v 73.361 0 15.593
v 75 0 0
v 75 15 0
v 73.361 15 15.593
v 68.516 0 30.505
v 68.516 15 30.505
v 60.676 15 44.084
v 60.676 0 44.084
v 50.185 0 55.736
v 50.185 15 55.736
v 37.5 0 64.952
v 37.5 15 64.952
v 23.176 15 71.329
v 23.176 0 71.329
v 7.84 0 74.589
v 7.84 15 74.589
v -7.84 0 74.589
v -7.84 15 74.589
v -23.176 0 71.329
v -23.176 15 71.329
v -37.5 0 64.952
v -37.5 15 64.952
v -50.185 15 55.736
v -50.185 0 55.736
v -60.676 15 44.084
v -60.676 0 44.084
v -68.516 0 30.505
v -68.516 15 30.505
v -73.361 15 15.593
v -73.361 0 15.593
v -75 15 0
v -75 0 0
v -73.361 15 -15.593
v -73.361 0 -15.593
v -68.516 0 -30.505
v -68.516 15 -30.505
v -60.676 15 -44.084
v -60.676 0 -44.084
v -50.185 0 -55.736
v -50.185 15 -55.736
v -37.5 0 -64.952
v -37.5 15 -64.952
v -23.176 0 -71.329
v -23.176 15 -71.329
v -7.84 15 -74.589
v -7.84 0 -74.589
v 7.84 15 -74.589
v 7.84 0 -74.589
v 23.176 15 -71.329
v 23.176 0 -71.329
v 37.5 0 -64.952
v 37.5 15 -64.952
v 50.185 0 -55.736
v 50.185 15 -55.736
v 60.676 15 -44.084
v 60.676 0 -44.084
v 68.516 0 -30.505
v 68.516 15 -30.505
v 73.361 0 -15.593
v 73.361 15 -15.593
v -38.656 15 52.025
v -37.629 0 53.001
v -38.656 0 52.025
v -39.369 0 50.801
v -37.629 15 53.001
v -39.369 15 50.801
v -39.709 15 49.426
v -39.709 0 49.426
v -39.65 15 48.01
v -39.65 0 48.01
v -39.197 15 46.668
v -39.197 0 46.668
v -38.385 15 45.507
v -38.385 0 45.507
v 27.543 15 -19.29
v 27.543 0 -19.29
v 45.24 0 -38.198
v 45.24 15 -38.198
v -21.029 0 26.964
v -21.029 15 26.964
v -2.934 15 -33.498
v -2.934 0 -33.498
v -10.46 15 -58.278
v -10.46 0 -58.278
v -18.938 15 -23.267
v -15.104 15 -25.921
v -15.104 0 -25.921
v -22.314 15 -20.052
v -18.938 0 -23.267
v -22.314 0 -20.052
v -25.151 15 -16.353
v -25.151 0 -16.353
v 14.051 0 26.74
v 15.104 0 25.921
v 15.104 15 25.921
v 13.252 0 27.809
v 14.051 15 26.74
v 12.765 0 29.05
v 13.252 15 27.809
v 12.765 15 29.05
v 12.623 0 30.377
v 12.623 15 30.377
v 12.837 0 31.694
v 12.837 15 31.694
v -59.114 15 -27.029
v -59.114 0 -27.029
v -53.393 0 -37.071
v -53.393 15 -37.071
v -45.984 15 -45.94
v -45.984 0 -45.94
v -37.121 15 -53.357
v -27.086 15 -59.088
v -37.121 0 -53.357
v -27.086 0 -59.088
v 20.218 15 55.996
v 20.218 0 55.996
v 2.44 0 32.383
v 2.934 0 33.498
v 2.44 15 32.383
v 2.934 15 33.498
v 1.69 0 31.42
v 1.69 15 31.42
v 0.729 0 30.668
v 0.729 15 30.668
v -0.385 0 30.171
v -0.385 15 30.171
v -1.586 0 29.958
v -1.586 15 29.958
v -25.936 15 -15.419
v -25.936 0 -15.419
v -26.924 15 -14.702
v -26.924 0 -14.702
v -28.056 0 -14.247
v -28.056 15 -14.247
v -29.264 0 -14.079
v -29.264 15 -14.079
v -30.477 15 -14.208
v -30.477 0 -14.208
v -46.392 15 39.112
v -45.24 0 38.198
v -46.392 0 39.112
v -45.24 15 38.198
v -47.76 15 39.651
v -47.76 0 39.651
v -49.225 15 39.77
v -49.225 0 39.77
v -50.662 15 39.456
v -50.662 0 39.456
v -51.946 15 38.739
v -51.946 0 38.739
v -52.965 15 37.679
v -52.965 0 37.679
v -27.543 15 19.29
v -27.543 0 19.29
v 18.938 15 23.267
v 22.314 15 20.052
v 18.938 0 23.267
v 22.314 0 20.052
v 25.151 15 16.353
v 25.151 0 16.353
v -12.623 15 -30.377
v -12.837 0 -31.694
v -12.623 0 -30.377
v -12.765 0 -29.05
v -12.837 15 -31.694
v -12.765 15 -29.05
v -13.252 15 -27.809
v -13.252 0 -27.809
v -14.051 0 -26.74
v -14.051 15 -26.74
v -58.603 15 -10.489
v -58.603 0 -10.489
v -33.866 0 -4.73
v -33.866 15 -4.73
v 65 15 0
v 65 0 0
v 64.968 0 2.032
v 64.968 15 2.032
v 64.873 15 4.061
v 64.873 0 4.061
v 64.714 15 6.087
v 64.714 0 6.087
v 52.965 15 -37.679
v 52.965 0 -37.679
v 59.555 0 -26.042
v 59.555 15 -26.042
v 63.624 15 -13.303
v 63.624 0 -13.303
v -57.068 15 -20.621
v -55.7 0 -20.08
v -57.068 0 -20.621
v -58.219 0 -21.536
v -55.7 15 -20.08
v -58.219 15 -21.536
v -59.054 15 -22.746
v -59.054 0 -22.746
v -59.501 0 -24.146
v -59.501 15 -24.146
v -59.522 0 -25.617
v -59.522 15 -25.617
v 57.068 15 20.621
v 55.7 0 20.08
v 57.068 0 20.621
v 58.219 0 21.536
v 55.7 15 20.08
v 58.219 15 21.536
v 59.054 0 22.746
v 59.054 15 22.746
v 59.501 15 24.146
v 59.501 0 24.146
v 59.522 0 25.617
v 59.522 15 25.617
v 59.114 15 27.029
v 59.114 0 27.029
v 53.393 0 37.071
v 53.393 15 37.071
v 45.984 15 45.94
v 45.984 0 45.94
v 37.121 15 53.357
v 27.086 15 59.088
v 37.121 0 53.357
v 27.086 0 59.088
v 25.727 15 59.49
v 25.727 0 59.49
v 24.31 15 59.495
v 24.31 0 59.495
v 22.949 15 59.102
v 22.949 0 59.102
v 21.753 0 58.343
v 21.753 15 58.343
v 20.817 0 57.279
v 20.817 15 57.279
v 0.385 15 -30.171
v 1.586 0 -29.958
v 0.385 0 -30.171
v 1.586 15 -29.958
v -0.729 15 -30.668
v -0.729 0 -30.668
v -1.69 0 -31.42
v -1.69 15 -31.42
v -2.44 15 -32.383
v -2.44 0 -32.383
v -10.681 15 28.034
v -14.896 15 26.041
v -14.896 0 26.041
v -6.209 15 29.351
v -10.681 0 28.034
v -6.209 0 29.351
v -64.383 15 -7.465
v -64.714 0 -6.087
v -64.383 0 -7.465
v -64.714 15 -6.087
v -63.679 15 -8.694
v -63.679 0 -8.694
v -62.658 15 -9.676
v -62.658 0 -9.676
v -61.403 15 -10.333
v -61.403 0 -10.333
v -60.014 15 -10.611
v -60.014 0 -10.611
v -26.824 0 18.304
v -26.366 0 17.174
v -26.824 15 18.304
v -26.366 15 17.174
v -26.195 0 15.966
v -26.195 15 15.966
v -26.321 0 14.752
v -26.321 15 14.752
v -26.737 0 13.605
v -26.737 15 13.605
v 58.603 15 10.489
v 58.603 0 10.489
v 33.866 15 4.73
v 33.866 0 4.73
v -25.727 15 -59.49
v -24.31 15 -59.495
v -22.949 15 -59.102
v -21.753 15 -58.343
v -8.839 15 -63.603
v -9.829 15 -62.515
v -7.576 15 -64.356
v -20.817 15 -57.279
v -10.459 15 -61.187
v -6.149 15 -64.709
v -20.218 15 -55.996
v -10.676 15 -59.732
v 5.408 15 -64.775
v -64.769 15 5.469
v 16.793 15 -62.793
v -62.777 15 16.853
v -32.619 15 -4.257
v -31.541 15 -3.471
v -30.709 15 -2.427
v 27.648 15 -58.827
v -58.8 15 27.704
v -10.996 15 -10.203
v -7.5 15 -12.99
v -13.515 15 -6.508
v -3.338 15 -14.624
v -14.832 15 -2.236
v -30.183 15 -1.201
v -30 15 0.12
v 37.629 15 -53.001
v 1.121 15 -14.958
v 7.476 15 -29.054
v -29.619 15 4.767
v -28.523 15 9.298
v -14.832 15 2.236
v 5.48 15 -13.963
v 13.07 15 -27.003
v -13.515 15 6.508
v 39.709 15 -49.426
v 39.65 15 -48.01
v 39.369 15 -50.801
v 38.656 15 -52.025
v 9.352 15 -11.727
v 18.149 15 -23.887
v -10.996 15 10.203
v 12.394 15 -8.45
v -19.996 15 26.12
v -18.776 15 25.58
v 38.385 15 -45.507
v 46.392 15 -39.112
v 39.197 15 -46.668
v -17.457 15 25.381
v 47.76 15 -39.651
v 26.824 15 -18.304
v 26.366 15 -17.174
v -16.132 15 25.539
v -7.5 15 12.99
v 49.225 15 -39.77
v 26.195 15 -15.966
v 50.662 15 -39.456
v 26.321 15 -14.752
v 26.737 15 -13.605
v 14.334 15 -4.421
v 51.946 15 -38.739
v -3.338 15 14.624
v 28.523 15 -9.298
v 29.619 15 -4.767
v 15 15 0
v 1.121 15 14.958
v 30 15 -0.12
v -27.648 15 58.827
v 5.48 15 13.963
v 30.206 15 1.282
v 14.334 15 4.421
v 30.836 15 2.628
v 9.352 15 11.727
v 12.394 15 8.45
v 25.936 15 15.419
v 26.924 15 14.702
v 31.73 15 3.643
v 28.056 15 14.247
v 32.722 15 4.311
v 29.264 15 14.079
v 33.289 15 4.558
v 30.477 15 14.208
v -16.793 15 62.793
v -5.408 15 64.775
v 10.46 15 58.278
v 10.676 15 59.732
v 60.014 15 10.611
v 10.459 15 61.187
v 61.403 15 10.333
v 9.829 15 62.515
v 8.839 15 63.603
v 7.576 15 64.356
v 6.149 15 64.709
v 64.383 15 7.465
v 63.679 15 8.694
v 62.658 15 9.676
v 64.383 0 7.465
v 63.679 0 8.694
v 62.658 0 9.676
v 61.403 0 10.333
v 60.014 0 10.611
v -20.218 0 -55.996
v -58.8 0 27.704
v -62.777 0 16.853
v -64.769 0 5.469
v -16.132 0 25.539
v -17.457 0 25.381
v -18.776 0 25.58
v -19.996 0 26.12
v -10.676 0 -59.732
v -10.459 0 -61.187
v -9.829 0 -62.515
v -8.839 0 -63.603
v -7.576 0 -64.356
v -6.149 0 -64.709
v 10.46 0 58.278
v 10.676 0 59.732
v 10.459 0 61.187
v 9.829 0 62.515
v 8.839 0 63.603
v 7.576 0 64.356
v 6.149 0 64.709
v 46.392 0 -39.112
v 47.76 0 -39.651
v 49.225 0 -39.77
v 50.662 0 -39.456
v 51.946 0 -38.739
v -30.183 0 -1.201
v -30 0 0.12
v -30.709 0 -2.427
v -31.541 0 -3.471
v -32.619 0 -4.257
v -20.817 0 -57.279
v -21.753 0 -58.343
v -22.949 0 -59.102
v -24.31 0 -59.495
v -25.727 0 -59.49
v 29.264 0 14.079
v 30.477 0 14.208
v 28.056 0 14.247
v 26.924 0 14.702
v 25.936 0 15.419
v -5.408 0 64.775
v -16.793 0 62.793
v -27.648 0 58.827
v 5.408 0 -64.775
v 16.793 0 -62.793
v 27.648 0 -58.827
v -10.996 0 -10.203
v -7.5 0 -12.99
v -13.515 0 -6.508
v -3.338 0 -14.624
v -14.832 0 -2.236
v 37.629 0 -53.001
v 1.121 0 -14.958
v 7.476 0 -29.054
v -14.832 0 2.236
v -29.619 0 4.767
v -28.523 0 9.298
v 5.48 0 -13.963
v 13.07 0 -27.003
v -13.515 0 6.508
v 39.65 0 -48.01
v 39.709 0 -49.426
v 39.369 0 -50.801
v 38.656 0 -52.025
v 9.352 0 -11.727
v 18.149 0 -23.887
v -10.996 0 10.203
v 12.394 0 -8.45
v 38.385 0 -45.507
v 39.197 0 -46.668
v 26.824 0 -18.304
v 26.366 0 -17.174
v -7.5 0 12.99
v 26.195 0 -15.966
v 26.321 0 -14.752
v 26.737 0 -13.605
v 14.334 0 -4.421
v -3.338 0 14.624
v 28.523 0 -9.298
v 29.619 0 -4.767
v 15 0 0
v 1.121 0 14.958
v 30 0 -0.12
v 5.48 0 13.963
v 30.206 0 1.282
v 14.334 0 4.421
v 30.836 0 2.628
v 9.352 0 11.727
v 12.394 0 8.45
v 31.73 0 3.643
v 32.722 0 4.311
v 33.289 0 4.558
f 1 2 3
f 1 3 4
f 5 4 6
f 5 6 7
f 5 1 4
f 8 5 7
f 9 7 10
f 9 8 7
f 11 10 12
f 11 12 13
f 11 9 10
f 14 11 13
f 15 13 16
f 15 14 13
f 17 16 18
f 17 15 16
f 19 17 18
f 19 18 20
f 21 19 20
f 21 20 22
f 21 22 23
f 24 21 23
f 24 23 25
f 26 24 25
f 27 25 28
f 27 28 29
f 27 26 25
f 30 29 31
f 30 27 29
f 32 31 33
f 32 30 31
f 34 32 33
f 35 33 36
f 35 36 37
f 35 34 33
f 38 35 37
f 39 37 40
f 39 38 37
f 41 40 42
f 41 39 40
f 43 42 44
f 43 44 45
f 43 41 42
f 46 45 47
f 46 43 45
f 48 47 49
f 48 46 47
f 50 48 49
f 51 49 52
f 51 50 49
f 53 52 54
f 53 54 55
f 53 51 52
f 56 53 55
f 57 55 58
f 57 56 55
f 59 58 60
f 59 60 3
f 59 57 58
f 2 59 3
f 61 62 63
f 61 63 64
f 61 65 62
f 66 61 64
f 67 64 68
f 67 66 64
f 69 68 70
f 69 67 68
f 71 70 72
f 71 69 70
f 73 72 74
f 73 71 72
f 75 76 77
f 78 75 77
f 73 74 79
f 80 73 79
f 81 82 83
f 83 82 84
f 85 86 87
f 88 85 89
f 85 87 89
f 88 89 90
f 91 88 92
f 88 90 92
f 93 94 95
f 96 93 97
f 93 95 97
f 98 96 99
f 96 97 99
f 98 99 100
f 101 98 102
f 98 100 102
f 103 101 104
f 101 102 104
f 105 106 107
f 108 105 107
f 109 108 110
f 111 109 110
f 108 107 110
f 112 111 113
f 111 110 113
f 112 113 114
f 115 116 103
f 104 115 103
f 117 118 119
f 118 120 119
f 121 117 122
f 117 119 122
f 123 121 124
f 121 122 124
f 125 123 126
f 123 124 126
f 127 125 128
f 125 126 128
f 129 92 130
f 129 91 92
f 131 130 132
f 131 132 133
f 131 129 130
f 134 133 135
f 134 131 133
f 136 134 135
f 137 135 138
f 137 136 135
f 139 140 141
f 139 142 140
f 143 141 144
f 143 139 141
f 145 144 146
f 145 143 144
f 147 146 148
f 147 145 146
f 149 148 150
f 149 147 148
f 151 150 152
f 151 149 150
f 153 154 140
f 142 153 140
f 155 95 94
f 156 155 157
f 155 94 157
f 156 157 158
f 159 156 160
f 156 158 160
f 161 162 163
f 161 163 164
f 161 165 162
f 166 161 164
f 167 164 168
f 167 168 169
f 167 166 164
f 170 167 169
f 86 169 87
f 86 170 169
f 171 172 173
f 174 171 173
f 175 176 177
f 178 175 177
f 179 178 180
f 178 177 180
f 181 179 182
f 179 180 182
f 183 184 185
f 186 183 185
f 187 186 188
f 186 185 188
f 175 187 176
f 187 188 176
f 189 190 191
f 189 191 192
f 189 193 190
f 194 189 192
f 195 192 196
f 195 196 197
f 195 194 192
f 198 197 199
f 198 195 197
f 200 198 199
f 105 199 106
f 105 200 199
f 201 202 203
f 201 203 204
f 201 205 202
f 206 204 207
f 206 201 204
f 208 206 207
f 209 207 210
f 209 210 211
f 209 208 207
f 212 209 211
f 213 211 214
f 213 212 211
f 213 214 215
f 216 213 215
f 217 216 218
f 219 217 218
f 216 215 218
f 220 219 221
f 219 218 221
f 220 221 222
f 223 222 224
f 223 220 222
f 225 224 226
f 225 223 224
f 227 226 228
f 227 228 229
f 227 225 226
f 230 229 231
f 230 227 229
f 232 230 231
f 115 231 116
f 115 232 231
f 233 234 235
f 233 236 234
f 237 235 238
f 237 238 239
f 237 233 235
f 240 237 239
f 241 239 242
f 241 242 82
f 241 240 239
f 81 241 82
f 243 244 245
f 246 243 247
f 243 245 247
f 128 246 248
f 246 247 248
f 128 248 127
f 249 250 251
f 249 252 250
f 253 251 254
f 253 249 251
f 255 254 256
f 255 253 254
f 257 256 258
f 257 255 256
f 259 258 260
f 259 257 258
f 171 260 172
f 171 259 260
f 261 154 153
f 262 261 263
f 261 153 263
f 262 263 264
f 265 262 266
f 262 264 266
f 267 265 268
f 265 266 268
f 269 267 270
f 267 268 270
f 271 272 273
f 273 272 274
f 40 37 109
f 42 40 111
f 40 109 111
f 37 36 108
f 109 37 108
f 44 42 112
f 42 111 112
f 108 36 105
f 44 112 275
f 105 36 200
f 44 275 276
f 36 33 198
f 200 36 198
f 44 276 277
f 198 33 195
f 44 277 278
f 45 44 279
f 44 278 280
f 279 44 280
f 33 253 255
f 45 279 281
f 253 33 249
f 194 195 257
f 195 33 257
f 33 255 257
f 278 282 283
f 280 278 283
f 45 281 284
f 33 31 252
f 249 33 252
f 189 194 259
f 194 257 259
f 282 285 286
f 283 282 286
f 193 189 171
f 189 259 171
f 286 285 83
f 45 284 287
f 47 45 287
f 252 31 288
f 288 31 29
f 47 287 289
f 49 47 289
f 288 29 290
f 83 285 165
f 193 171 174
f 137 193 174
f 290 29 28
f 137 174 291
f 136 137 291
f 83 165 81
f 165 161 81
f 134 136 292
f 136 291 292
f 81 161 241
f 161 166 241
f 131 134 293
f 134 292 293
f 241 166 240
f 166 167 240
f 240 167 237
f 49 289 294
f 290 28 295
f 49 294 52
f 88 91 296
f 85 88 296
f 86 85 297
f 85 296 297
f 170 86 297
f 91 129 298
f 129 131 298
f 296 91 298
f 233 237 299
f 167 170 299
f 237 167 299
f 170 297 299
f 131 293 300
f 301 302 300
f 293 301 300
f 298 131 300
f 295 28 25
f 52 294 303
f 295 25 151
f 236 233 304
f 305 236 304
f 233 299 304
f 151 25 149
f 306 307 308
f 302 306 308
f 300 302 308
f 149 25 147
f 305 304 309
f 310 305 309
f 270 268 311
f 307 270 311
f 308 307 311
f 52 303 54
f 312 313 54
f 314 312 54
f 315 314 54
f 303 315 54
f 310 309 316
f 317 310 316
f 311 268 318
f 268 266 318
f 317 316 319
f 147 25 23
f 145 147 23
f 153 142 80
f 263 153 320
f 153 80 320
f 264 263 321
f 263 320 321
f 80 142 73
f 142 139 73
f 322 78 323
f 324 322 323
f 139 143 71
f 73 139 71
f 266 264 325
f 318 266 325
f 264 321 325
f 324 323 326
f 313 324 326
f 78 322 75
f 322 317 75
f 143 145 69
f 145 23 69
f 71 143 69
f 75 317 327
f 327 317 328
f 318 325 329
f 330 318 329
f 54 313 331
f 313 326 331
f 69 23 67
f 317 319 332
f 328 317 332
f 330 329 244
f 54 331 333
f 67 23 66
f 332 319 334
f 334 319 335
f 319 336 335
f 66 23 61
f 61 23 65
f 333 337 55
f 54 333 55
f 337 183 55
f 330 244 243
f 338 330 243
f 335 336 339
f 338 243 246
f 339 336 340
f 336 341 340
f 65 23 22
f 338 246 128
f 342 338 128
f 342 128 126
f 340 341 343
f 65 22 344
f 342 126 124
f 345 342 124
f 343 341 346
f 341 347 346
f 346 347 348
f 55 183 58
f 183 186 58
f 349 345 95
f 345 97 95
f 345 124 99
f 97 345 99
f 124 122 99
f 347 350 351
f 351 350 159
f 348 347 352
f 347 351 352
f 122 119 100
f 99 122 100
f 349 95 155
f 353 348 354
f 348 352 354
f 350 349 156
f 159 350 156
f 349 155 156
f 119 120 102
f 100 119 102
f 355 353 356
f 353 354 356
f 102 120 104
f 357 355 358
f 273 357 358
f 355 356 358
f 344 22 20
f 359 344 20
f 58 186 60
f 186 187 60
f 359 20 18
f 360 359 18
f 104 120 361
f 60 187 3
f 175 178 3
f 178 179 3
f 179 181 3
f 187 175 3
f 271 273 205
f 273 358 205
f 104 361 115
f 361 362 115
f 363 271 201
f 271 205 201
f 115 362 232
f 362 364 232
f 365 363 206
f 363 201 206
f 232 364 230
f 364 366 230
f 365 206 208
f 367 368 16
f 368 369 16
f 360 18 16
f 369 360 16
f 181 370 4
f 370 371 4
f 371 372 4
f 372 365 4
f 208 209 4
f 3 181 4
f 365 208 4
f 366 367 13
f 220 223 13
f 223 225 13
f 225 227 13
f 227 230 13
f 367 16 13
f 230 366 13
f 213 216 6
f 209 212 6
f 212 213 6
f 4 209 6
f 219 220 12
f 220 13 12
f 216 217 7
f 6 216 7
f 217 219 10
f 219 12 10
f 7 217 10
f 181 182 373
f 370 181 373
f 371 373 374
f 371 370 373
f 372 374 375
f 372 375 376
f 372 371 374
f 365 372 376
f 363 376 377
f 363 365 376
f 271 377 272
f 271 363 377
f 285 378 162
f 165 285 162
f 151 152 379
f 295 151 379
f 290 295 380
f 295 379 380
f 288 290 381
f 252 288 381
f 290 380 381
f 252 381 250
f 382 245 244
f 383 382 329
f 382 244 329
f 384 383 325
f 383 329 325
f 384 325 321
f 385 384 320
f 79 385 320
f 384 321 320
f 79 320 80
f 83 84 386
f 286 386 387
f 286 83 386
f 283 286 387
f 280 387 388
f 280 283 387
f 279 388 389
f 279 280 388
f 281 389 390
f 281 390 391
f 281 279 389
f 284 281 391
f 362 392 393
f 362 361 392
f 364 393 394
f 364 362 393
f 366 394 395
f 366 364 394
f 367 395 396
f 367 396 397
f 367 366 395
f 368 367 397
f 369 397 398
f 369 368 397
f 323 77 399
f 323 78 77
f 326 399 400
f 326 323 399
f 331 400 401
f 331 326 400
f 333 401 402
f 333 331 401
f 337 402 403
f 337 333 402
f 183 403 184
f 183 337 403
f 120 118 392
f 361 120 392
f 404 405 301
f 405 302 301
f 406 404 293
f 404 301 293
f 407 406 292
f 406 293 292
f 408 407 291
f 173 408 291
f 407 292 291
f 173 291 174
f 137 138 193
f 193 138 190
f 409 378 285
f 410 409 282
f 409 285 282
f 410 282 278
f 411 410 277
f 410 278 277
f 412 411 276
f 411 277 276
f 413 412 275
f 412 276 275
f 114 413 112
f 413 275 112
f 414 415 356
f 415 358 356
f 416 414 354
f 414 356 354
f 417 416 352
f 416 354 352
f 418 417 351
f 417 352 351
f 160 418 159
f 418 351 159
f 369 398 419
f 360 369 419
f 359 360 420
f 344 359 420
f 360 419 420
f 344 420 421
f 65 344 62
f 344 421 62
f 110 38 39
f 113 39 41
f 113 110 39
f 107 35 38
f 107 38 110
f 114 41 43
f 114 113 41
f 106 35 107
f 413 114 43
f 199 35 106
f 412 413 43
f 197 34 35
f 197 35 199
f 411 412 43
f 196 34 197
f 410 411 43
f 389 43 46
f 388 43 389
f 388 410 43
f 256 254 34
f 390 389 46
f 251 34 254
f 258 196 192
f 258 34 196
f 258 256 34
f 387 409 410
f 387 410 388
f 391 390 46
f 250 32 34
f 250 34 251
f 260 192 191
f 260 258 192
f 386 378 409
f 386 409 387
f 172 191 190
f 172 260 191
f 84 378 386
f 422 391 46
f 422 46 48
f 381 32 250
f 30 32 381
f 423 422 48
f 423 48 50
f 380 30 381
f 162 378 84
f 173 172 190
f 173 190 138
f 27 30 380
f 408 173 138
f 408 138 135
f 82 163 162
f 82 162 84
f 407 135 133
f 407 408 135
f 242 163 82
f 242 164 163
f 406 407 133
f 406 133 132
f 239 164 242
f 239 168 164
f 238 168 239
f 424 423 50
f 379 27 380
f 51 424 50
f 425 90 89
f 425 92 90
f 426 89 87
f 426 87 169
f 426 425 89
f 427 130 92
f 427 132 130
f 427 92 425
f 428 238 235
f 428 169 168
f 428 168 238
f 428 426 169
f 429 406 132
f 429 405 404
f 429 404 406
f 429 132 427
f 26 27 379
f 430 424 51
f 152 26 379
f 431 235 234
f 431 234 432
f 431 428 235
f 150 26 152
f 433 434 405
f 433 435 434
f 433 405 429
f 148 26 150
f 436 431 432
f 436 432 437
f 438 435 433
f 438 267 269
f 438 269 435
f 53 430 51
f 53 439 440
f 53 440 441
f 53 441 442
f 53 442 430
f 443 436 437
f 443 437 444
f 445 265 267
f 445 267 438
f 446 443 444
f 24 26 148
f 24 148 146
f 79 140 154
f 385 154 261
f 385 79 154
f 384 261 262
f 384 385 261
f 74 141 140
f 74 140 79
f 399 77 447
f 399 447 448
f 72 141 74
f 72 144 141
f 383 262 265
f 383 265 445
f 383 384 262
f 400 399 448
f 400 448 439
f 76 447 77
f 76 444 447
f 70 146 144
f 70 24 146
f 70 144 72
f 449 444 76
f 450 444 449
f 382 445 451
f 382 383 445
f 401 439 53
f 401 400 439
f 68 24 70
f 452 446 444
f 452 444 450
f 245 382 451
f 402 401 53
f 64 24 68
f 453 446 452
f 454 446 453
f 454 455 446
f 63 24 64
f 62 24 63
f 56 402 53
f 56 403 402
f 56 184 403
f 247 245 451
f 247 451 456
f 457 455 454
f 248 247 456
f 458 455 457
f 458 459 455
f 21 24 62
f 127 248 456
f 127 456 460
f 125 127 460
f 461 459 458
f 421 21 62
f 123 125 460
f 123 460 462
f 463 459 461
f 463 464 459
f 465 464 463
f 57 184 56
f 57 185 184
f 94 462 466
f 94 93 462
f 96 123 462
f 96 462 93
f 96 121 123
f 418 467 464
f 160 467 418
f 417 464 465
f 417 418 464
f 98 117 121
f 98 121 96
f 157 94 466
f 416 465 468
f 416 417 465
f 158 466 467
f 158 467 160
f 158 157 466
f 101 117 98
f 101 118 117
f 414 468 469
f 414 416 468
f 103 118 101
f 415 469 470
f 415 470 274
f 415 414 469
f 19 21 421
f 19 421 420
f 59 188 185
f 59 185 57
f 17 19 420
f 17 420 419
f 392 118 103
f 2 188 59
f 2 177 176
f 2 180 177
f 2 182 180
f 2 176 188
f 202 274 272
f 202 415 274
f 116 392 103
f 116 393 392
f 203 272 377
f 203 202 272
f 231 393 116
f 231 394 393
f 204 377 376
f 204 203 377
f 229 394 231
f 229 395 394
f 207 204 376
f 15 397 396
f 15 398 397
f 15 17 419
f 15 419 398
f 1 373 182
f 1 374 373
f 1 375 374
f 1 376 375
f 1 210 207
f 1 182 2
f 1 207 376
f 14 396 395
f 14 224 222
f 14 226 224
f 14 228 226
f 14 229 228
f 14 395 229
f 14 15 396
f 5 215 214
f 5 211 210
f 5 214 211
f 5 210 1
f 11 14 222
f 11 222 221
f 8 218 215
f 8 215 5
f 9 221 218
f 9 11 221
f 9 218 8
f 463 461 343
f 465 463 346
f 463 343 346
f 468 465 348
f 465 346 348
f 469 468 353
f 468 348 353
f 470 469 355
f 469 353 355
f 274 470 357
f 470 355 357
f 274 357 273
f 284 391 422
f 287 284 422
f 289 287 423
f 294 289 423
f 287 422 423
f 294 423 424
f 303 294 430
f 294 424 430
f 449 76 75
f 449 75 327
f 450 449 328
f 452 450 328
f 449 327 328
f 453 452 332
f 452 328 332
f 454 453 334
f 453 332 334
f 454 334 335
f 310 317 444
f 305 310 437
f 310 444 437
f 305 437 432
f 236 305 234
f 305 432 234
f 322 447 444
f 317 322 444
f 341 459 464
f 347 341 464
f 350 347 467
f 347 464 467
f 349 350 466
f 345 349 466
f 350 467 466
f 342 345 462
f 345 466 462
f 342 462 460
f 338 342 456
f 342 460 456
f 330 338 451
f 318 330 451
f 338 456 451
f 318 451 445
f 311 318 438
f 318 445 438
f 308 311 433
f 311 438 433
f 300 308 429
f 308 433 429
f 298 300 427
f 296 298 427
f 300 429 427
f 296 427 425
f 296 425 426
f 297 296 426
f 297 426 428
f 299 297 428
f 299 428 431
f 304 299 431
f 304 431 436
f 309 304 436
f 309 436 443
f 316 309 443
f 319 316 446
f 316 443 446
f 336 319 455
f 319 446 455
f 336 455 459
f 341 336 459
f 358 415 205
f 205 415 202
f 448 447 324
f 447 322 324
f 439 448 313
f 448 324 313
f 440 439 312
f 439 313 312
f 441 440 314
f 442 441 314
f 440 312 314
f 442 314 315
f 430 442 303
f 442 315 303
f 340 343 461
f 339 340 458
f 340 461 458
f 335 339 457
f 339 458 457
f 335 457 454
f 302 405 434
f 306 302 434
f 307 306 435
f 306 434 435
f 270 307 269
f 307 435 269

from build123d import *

# Parameters (mm, degrees)
F0_R     = 75
F0_R_2   = 15
F1_DEPTH = 15
F3_DEPTH = 25
F4_R     = 5
F5_R     = 5


with BuildPart() as f1:
    # F0 (on Front) → F1 (new body)
    with BuildSketch(Plane.XZ):
        Circle(F0_R)
        Circle(F0_R_2, mode=Mode.SUBTRACT)
    extrude(amount=-F1_DEPTH)

    # F2 (on face) → F3 (cut)
    with BuildSketch(Plane.XZ):
        with BuildLine():
            ThreePointArc((-29.761636, -3.774261), (-29.2124, 6.829033), (-25.004101, 16.57694))
            Line((-25.004101, 16.57694), (-49.222236, 42.45199))
            ThreePointArc((-49.222236, 42.45199), (-62.729048, 17.031339), (-63.932898, -11.729645))
            Line((-63.932898, -11.729645), (-29.761636, -3.774261))
        make_face()
        with BuildLine():
            ThreePointArc((-18.149424, 23.887202), (-8.692084, 28.713197), (1.854001, 29.942657))
            Line((1.854001, 29.942657), (12.153383, 63.853702))
            ThreePointArc((12.153383, 63.853702), (-16.614952, 62.840619), (-42.12462, 49.502691))
            Line((-42.12462, 49.502691), (-18.149424, 23.887202))
        make_face()
        with BuildLine():
            ThreePointArc((11.612212, 27.661463), (20.520316, 21.884164), (26.858102, 13.365716))
            Line((26.858102, 13.365716), (61.37562, 21.401712))
            ThreePointArc((61.37562, 21.401712), (46.114096, 45.80928), (21.808278, 61.232336))
            Line((21.808278, 61.232336), (11.612212, 27.661463))
        make_face()
        with BuildLine():
            ThreePointArc((29.761636, 3.774261), (29.94035, 1.89089), (30, 0))
            ThreePointArc((30, 0), (28.723884, -8.656702), (25.004101, -16.57694))
            Line((25.004101, -16.57694), (49.222236, -42.45199))
            ThreePointArc((49.222236, -42.45199), (60.928012, -22.644587), (65, 0))
            ThreePointArc((65, 0), (64.732675, 5.889043), (63.932898, 11.729645))
            Line((63.932898, 11.729645), (29.761636, 3.774261))
        make_face()
        with BuildLine():
            Line((42.12462, -49.502691), (18.149424, -23.887202))
            ThreePointArc((18.149424, -23.887202), (8.692084, -28.713197), (-1.854001, -29.942657))
            Line((-1.854001, -29.942657), (-12.153383, -63.853702))
            ThreePointArc((-12.153383, -63.853702), (16.614952, -62.840619), (42.12462, -49.502691))
        make_face()
        with BuildLine():
            Line((-21.808278, -61.232336), (-11.612212, -27.661463))
            ThreePointArc((-11.612212, -27.661463), (-20.520316, -21.884164), (-26.858102, -13.365716))
            Line((-26.858102, -13.365716), (-61.37562, -21.401712))
            ThreePointArc((-61.37562, -21.401712), (-46.114096, -45.80928), (-21.808278, -61.232336))
        make_face()
    extrude(amount=-F3_DEPTH, mode=Mode.SUBTRACT)

    # F4
    f4_edges = [f1.edges().sort_by_distance(p)[0] for p in [
        (-63.932898, 7.5, -11.729645),
        (-49.222236, 7.5, 42.45199),
        (12.153383, 7.5, 63.853702),
        (-42.12462, 7.5, 49.502691),
        (21.808278, 7.5, 61.232336),
        (61.37562, 7.5, 21.401712),
        (63.932898, 7.5, 11.729645),
        (49.222236, 7.5, -42.45199),
        (42.12462, 7.5, -49.502691),
        (-12.153383, 7.5, -63.853702),
        (-21.808278, 7.5, -61.232336),
        (-61.37562, 7.5, -21.401712),
    ]]
    fillet(f4_edges, radius=F4_R)

    # F5
    f5_edges = [f1.edges().sort_by_distance(p)[0] for p in [
        (25.004101, 7.5, -16.57694),
        (29.761636, 7.5, 3.774261),
        (-1.854001, 7.5, -29.942657),
        (-11.612212, 7.5, -27.661463),
        (-26.858102, 7.5, -13.365716),
        (-29.761636, 7.5, -3.774261),
        (-25.004101, 7.5, 16.57694),
        (-18.149424, 7.5, 23.887202),
        (1.854001, 7.5, 29.942657),
        (11.612212, 7.5, 27.661463),
        (26.858102, 7.5, 13.365716),
    ]]
    fillet(f5_edges, radius=F5_R)


solid = f1.part
